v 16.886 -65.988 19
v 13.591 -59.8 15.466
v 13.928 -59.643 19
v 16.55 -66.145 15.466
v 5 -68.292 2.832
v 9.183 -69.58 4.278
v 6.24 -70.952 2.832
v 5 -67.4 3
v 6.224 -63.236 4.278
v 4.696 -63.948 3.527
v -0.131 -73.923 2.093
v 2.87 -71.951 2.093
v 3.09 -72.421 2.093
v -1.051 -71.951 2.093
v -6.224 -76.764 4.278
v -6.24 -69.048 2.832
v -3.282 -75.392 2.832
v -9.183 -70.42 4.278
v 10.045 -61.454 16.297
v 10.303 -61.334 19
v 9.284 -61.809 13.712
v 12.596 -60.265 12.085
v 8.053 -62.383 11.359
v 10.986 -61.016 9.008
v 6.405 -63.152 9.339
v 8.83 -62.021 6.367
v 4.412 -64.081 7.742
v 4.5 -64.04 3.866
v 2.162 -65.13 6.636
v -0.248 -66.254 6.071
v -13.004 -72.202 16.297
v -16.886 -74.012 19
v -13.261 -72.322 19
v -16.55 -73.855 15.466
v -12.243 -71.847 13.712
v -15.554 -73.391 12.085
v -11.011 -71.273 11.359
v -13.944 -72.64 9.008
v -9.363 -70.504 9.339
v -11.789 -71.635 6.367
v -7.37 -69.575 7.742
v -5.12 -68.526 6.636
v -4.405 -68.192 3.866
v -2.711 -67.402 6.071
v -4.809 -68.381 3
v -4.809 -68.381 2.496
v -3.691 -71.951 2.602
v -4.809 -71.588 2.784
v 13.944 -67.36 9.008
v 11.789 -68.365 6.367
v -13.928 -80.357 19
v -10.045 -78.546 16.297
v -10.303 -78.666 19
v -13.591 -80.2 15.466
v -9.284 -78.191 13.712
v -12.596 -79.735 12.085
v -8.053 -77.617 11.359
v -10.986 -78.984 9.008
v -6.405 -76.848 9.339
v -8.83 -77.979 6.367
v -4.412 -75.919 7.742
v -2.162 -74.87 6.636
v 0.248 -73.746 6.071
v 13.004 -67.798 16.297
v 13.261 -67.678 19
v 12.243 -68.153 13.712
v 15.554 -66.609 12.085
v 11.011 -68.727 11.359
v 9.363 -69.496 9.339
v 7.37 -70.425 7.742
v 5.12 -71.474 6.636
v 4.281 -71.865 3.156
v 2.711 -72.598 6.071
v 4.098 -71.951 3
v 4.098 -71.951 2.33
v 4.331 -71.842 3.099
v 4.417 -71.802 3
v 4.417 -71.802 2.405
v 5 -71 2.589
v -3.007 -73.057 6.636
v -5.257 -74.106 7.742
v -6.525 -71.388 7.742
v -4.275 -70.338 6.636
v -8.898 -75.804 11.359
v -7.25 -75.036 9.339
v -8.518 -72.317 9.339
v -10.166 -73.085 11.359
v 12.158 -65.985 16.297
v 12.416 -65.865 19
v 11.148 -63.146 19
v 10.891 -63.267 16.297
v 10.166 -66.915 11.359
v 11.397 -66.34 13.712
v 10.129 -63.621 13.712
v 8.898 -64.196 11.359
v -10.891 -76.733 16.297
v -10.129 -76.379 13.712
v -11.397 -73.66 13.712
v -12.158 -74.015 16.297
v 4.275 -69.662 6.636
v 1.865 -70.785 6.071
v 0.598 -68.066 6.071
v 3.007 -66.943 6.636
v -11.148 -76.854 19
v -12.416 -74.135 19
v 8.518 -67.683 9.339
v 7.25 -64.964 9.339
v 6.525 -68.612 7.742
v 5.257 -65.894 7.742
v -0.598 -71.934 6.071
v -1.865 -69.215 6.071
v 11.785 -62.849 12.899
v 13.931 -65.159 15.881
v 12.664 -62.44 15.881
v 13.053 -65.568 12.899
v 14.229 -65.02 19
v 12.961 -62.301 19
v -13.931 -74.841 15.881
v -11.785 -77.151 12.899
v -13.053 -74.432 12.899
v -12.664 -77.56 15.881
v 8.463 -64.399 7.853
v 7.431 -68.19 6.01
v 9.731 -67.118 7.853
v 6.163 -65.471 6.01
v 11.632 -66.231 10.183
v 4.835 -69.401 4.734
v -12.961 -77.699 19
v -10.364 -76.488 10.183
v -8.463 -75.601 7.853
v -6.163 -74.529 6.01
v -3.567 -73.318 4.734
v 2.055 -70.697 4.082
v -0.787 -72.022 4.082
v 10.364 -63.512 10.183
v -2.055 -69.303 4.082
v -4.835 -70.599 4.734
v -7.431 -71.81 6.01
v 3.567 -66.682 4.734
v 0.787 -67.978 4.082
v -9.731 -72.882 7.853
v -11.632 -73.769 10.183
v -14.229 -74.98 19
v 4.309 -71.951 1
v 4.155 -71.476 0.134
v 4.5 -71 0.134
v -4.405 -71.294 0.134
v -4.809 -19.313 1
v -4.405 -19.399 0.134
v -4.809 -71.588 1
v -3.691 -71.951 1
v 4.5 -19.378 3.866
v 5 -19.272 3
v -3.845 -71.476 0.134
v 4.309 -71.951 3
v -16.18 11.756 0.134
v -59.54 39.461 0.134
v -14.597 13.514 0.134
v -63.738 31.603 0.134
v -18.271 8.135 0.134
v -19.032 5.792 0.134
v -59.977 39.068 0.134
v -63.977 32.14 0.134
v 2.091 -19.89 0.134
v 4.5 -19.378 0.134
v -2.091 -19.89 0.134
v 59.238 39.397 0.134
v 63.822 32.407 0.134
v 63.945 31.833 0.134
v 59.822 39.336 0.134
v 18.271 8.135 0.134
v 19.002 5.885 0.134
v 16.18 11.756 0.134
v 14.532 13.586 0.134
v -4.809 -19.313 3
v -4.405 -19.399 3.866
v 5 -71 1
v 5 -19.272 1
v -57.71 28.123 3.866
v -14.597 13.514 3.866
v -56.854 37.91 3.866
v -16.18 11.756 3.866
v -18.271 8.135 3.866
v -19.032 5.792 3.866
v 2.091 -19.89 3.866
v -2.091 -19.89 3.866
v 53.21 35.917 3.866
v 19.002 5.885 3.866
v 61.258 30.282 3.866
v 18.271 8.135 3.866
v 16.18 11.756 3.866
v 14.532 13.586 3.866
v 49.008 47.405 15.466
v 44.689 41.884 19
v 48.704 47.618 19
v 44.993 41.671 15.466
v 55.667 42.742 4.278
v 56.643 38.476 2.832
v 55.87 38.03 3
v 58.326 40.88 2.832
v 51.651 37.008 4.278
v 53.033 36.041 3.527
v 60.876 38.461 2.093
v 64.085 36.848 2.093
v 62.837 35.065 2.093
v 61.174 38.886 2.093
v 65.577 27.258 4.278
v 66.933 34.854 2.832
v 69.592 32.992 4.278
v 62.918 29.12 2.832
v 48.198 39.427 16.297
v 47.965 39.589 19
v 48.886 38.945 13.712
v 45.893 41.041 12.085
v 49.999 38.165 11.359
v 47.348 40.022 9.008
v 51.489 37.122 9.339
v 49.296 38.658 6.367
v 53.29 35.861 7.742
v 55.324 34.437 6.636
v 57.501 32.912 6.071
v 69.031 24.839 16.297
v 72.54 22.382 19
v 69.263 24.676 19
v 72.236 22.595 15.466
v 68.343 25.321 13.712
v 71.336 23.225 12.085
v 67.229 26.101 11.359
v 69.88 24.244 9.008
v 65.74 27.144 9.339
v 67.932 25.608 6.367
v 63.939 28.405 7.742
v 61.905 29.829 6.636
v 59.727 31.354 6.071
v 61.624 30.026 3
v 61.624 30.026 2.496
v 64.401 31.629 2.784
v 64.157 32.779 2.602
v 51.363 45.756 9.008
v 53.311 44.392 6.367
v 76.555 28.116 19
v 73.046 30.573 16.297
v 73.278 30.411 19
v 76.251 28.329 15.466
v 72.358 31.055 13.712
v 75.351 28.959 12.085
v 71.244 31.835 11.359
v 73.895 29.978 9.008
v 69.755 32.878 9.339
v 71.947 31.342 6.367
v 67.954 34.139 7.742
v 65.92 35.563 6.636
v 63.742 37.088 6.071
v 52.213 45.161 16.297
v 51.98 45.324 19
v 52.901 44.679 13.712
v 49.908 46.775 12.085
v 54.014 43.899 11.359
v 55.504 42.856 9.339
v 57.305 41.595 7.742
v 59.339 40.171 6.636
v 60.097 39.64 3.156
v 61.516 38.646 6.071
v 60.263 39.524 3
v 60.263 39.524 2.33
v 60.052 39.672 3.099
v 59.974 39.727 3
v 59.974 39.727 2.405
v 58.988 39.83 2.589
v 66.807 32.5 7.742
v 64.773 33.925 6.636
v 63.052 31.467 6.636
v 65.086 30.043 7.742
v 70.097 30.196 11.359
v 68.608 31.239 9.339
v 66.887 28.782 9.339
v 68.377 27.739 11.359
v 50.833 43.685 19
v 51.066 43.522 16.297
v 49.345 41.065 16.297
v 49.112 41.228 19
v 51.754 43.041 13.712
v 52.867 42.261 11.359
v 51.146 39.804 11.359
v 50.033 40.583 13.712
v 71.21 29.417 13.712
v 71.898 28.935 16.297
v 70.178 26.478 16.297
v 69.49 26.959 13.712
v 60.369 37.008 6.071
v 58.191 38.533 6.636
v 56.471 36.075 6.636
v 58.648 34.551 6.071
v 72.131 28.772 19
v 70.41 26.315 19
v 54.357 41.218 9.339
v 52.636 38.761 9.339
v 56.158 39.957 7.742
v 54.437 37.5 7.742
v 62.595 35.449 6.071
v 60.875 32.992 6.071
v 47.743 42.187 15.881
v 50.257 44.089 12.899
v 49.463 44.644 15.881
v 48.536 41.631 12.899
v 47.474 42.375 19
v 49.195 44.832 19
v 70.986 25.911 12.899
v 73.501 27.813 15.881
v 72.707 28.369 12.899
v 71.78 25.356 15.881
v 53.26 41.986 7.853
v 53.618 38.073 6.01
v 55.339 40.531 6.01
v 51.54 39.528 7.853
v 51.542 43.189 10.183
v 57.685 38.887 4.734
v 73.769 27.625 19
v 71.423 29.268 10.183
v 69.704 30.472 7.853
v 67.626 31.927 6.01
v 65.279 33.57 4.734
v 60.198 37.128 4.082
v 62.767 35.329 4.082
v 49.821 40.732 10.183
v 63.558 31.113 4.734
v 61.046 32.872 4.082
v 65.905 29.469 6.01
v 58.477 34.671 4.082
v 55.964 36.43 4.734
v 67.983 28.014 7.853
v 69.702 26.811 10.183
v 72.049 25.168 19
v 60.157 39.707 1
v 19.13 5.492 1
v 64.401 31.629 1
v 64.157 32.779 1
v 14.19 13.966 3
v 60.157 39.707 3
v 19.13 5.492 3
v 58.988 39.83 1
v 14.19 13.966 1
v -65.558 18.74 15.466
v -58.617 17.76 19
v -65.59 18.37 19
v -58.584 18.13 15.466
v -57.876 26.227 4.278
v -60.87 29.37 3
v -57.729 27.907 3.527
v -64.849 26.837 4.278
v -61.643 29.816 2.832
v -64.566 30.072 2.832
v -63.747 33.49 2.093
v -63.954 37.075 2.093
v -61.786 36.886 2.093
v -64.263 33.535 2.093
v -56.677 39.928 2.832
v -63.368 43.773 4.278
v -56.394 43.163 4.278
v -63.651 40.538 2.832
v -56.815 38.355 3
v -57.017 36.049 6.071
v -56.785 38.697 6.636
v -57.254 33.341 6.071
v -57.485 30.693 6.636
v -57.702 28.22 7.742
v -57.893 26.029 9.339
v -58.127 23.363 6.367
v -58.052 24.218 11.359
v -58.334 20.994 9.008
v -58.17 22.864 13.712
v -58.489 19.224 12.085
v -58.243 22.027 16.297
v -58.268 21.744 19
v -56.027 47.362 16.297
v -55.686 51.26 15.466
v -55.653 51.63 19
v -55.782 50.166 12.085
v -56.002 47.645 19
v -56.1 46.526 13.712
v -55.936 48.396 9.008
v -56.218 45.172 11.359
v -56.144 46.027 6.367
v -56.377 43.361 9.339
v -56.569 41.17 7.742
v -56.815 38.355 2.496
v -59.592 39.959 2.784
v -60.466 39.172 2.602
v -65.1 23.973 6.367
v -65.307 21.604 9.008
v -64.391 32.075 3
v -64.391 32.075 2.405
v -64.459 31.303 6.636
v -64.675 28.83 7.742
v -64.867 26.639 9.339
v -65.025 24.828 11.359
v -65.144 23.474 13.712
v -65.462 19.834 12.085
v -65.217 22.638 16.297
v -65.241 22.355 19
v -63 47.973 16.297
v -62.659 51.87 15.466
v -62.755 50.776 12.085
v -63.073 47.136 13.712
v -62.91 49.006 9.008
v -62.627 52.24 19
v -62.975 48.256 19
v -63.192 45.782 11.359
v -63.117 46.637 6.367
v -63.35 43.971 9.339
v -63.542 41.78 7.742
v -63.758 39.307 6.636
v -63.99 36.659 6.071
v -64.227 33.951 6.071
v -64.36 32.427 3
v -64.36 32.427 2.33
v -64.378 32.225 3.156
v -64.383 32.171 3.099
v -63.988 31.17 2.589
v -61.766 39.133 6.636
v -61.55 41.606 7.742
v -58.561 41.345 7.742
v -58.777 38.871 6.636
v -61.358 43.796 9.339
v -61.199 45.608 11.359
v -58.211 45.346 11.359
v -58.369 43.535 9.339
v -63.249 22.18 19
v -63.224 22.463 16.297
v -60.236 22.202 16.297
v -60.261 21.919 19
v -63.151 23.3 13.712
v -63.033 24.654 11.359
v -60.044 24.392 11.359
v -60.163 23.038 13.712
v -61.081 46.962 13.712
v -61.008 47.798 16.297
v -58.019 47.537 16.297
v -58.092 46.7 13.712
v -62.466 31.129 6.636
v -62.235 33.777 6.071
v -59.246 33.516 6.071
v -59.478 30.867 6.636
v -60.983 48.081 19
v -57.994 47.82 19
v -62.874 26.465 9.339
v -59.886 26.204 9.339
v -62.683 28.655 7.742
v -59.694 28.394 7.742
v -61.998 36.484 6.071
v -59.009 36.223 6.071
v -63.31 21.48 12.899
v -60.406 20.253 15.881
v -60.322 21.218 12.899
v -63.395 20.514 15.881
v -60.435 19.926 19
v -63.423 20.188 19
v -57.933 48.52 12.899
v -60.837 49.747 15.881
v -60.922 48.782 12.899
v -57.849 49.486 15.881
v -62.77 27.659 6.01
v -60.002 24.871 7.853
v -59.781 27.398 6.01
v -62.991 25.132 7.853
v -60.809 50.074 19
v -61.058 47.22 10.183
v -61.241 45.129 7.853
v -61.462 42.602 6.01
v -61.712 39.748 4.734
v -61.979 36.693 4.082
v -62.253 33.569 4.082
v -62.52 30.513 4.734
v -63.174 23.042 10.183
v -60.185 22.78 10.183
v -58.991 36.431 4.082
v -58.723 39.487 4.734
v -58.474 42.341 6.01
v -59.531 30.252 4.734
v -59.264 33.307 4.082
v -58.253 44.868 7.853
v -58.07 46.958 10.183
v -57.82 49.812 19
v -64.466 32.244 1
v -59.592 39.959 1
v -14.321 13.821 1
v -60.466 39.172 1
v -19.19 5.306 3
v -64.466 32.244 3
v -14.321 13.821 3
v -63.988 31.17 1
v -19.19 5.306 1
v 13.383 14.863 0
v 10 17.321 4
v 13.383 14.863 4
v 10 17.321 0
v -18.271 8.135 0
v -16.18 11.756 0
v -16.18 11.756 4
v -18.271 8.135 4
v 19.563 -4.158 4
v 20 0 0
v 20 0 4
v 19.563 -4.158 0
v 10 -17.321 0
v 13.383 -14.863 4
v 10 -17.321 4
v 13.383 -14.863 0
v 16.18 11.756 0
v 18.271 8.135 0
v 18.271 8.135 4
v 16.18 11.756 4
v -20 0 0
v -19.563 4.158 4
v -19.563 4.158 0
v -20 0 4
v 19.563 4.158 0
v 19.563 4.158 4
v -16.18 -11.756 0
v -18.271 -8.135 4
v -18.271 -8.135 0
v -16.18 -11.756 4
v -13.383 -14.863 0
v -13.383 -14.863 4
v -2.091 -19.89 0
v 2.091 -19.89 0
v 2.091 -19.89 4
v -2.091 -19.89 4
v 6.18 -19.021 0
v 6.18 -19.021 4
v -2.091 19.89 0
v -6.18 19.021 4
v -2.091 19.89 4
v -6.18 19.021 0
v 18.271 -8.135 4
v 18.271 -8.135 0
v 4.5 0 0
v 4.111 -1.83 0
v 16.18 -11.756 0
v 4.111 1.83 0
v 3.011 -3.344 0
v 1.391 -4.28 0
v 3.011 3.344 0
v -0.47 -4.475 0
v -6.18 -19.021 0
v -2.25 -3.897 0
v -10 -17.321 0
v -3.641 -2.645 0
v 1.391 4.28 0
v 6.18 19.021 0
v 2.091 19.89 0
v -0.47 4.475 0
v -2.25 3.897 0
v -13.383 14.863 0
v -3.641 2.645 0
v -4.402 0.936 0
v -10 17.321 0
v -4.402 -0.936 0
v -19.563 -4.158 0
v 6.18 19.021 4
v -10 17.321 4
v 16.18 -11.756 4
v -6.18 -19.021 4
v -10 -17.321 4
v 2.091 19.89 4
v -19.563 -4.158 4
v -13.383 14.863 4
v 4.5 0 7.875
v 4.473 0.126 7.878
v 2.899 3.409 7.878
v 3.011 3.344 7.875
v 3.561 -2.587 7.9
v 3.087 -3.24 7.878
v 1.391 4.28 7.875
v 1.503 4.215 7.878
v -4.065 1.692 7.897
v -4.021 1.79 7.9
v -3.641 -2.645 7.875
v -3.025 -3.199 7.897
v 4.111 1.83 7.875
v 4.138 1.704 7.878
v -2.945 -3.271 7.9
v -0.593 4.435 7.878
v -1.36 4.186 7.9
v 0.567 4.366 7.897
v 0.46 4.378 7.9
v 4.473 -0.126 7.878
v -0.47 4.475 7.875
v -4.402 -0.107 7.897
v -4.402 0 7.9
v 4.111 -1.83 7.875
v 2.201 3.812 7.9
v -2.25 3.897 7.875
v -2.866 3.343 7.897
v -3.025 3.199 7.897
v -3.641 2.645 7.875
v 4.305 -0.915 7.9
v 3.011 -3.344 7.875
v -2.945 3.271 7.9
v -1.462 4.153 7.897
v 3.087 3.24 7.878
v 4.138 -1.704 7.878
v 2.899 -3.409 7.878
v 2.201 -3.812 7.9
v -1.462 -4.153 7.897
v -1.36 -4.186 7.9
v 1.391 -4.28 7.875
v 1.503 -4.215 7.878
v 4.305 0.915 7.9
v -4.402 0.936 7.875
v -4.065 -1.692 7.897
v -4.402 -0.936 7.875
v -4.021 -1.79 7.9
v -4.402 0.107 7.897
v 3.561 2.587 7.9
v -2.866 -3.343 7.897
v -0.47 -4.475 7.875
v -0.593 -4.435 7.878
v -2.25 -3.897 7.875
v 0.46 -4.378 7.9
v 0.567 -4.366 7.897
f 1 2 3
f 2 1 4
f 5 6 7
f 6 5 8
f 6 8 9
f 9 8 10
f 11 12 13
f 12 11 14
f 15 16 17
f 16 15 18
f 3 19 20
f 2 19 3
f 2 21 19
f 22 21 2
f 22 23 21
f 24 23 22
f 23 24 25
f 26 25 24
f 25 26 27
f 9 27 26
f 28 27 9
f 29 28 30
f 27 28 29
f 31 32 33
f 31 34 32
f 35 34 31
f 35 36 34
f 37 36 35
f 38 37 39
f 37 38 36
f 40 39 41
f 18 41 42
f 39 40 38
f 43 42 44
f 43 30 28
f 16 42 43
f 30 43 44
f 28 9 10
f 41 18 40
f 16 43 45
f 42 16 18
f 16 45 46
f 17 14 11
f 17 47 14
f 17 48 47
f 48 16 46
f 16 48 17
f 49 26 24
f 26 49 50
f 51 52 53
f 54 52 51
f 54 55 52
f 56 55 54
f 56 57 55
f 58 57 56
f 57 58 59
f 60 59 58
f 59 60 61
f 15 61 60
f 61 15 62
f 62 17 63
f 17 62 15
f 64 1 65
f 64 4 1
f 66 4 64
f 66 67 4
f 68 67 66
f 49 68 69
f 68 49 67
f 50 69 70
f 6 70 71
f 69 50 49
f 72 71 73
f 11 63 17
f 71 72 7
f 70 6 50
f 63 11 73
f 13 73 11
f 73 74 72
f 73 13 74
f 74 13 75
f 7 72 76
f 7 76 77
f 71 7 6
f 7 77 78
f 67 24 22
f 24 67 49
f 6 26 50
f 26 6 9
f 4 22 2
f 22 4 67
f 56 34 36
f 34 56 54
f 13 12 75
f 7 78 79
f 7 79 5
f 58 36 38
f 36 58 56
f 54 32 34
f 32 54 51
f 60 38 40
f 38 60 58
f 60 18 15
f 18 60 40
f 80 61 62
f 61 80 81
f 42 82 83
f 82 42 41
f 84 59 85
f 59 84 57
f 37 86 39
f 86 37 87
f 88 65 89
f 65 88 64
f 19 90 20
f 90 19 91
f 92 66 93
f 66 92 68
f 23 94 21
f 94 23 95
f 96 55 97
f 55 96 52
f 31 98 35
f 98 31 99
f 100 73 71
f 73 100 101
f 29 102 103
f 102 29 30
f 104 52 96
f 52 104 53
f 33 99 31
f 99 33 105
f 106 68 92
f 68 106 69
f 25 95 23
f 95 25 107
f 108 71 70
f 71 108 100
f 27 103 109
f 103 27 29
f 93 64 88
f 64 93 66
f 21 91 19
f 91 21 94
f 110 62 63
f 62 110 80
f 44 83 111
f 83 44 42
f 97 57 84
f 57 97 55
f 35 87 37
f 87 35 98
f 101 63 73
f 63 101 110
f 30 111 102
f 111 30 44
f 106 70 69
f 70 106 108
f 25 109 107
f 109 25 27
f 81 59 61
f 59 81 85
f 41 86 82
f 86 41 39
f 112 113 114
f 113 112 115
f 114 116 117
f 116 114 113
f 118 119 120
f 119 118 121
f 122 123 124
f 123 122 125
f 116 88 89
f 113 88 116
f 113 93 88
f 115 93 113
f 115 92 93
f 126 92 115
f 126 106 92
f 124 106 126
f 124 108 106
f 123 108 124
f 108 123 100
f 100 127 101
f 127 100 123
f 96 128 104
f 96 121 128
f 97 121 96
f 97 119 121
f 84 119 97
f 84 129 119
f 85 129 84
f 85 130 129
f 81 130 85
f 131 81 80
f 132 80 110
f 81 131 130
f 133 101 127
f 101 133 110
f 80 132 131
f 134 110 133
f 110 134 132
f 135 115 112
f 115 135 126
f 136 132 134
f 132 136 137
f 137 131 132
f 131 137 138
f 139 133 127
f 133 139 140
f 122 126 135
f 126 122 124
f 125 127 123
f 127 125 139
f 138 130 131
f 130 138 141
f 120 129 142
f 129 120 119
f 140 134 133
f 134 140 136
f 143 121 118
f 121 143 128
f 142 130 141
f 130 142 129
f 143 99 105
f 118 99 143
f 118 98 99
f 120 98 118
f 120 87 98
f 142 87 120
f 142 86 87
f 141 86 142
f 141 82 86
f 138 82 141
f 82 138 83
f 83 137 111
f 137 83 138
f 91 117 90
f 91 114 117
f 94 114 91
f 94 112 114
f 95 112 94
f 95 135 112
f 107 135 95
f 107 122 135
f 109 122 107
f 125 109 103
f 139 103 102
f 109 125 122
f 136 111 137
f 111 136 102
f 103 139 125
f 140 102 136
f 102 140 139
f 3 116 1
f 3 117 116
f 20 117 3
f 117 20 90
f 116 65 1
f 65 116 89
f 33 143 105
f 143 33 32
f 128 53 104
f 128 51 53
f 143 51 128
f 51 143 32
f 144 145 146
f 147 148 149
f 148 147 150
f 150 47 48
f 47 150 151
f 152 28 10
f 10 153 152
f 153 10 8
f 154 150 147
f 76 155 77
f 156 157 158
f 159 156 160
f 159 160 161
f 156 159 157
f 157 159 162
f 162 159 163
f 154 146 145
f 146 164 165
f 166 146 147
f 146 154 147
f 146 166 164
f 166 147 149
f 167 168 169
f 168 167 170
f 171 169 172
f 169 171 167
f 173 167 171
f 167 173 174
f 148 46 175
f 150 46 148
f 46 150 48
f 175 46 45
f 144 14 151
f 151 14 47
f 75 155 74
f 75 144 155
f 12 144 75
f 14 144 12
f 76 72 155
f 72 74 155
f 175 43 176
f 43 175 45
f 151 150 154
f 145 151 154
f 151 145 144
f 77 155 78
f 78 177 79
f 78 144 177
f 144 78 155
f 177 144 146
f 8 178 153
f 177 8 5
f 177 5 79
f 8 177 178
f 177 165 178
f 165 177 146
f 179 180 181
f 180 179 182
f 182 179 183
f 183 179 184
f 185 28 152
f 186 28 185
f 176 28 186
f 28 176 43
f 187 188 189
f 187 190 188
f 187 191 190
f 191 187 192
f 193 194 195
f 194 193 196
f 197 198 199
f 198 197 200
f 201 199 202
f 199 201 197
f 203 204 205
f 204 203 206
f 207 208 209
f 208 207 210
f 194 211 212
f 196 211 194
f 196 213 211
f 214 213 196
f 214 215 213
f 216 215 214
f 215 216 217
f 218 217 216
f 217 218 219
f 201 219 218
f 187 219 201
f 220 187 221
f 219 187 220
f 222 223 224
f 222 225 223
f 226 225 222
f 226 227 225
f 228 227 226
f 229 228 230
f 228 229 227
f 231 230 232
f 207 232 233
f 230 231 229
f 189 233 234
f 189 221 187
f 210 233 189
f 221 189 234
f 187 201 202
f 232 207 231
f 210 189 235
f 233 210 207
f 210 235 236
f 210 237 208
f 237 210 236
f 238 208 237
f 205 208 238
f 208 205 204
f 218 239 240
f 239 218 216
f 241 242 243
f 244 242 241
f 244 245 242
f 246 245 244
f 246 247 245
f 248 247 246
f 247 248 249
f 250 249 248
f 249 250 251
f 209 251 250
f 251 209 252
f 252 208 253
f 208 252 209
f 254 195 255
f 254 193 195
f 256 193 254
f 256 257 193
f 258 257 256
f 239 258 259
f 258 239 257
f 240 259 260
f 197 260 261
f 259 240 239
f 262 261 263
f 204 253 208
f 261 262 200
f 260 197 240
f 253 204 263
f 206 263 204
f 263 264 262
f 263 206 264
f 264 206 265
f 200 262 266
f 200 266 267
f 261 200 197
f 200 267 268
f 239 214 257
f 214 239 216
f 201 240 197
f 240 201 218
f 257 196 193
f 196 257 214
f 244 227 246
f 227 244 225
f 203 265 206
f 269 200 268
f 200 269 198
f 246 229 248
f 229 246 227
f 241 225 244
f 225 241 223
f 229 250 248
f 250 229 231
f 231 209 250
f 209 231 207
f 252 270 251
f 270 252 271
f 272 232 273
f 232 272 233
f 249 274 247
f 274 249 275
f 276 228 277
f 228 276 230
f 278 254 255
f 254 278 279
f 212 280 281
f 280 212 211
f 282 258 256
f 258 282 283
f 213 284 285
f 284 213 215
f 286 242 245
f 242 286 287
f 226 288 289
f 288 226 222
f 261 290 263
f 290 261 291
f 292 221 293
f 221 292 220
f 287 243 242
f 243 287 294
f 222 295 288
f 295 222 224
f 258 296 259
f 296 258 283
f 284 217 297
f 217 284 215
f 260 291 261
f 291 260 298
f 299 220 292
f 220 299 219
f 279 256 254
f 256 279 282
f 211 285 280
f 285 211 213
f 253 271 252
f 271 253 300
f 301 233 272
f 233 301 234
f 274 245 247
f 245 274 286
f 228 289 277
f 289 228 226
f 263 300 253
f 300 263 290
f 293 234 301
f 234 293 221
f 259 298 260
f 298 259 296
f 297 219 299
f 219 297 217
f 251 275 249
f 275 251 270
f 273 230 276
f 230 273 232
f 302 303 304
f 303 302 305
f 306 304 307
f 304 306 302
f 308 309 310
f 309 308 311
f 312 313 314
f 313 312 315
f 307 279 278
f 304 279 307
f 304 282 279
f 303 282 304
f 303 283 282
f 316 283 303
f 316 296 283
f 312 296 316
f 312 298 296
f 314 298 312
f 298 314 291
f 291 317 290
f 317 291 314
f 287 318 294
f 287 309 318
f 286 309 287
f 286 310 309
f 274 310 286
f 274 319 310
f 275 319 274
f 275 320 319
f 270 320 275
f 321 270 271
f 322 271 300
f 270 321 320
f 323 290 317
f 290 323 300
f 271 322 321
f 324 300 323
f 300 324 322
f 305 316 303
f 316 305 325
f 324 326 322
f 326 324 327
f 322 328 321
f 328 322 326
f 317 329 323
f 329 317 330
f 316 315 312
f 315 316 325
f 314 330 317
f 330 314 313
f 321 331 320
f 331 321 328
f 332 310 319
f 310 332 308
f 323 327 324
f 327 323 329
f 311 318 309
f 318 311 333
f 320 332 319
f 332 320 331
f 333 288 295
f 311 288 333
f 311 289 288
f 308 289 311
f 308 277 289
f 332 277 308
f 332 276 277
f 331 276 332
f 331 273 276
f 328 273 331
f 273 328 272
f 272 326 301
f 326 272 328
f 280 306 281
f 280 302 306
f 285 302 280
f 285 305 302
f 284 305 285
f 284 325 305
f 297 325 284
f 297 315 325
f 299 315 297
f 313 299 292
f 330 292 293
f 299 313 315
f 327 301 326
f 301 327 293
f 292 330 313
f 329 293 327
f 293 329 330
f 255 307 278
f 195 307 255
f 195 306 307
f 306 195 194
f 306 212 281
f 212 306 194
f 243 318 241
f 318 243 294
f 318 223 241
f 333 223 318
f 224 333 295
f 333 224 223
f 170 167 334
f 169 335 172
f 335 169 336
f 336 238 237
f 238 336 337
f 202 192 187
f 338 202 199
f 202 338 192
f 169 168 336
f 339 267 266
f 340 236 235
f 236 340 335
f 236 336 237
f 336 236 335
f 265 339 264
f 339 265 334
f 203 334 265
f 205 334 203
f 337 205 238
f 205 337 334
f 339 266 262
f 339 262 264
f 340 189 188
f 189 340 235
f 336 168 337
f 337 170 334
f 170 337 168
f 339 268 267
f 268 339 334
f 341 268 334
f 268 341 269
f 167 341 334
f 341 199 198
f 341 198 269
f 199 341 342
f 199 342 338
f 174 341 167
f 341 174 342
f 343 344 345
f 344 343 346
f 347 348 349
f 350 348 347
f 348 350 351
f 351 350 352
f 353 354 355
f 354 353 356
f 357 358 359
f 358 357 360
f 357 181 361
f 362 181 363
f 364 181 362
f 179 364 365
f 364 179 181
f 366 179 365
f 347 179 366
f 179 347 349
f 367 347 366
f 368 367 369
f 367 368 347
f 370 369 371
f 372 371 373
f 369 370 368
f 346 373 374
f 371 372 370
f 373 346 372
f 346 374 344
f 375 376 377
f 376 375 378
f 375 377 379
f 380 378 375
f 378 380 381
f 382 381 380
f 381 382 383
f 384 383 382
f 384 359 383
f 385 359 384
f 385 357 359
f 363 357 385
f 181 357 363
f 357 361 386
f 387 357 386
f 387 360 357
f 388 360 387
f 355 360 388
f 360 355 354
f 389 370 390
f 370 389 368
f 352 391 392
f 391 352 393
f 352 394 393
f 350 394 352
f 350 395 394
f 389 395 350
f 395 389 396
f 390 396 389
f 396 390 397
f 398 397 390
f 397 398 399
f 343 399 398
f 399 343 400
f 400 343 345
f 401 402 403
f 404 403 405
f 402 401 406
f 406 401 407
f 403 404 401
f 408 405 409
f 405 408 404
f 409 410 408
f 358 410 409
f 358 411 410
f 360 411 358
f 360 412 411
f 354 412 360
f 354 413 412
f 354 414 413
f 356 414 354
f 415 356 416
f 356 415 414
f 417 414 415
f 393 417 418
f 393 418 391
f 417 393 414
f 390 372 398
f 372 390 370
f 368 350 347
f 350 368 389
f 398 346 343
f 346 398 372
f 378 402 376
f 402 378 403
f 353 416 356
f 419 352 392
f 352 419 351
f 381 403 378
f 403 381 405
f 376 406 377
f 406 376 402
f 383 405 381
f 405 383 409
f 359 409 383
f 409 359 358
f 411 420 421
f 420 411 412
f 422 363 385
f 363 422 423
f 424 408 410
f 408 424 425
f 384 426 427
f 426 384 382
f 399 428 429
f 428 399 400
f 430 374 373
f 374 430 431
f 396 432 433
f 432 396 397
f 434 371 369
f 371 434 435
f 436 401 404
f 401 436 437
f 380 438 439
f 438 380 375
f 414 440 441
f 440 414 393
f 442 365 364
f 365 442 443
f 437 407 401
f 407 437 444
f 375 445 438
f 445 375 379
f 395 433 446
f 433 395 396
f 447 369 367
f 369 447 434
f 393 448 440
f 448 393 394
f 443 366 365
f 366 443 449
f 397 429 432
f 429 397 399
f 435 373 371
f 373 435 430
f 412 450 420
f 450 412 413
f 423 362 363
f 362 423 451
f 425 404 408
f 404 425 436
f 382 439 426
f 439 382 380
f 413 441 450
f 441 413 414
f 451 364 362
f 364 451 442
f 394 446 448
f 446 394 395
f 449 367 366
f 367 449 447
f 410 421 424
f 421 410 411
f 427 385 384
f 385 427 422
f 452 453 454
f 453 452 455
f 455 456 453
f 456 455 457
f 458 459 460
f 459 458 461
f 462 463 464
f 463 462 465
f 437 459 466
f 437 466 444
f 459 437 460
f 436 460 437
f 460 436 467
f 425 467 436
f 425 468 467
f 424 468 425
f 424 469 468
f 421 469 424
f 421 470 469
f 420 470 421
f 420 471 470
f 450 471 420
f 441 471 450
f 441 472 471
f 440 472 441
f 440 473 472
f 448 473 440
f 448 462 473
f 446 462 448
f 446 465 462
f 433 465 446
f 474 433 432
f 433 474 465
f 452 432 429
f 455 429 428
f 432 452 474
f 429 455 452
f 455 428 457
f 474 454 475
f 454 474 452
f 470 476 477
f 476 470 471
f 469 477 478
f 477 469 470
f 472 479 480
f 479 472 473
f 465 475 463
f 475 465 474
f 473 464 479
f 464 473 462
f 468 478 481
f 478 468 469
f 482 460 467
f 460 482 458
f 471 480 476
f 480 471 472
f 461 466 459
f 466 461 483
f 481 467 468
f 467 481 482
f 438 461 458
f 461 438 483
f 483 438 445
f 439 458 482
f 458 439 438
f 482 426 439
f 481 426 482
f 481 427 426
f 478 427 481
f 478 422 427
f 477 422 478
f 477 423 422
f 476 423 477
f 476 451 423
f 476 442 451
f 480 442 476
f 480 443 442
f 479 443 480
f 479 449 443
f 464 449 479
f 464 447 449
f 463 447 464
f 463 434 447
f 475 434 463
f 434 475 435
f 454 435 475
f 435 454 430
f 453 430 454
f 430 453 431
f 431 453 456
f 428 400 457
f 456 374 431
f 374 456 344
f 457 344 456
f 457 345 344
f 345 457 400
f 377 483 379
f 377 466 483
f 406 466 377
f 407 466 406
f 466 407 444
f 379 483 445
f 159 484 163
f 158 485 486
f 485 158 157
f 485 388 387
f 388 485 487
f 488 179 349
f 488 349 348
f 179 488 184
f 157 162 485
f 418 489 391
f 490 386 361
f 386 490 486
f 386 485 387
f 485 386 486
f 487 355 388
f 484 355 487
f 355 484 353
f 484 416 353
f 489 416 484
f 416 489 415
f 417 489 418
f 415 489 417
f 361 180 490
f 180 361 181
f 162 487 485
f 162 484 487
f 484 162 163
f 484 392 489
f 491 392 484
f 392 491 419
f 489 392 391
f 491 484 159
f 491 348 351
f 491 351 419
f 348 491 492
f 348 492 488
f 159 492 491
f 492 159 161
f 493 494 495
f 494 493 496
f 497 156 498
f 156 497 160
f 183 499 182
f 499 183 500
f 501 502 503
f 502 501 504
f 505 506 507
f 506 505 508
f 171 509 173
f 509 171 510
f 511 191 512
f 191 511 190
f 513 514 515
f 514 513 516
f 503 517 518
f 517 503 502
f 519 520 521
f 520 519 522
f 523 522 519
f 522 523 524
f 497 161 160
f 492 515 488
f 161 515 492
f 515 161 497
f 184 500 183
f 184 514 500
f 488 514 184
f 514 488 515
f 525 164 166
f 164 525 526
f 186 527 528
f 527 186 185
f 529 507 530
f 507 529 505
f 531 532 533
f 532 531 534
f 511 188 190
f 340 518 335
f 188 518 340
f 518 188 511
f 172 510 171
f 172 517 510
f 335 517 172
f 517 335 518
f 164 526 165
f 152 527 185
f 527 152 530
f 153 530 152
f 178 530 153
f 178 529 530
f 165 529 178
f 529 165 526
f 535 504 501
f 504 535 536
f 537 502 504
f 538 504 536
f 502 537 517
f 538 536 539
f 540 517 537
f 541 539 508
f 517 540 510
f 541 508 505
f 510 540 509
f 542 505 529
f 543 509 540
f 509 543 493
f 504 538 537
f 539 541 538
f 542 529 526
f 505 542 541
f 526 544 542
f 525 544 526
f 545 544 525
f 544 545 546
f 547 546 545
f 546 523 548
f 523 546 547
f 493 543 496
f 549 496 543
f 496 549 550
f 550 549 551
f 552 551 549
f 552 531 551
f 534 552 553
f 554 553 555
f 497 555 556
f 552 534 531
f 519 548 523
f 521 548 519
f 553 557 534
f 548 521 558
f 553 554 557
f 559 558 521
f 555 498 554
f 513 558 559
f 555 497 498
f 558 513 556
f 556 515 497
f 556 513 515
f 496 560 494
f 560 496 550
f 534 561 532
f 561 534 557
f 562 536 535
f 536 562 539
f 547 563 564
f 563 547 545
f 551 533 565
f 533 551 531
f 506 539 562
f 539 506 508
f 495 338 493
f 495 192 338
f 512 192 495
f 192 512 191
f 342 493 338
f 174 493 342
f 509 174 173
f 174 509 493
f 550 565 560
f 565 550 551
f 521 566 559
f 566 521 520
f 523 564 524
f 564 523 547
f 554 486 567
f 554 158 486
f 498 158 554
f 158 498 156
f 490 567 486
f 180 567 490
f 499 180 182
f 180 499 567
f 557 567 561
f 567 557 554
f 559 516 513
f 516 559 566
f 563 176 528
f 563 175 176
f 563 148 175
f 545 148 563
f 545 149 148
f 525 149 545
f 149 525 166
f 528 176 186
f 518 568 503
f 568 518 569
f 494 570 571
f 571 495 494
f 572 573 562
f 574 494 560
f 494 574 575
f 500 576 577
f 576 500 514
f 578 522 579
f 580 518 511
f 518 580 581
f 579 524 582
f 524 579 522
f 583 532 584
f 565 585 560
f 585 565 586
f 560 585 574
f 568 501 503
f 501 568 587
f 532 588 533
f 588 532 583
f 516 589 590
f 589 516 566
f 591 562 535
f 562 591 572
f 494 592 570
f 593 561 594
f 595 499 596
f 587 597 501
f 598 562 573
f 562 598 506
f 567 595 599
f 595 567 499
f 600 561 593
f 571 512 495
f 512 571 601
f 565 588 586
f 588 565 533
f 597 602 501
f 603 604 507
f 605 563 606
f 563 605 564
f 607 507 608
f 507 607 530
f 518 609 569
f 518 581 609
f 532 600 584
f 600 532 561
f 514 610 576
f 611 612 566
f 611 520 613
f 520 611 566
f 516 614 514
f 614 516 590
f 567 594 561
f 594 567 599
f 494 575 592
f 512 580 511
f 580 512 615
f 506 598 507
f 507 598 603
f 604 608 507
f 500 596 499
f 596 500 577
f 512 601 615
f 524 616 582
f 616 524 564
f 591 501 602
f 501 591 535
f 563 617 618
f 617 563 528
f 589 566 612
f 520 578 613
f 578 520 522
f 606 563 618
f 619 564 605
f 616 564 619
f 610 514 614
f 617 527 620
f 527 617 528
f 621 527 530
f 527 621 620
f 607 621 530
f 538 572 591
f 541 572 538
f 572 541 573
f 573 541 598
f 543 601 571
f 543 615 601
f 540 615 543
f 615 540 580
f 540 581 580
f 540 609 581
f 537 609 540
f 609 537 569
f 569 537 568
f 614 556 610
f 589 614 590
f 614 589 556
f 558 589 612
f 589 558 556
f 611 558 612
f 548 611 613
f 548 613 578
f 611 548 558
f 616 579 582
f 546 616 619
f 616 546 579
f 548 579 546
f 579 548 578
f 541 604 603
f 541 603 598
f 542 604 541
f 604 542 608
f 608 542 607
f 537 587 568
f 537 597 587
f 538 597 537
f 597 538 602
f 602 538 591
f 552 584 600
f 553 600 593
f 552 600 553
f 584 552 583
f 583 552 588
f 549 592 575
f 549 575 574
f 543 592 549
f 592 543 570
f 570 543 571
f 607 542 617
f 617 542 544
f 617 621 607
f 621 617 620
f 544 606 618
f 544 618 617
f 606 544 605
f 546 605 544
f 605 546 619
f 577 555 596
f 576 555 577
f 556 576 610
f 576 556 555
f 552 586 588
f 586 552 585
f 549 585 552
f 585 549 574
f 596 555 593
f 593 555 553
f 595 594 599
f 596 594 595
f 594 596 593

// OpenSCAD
// file: common.scad
coin_small_diameter=30;
coin_big_diameter=36;
coin_height=3;

nut_diameter_inner = 6;
nut_diameter_outer = 8;

roller_diameter= 22;
roller_diameter_inner= 10;
roller_width = 8;
// main file
include <./common.scad>

branch_length = 70;
branch_width = 10;

holder_border_width = 2;

branch_height = holder_border_width * 2;
branch_softness = 1;

base_height = 8;
base_radius = branch_width*2;
coin_rotation = 25;

branches_number = 3;


module branch(coin_diameter){
    module coin(){#
        cylinder(h = coin_height, d= coin_diameter);
    }
    
    translate([0,-branch_length,0])
    union(){
        
        // Holder
        holder_diameter = coin_diameter + holder_border_width*2;
        holder_height = coin_height + holder_border_width*2;
        rotate([0,0,coin_rotation])
        translate([0,holder_height/2,holder_diameter/2 + holder_border_width])
        rotate([90,0,0])
        difference(){
            cylinder(h= holder_height, d= holder_diameter);

            translate([0,0,-0.1])
            cylinder(h= holder_height + 0.2, d = coin_diameter - holder_border_width*2);

            translate([0,0,holder_border_width])
            coin();

            rotate([90,0,0])
            translate([-holder_diameter/2,-0.1,-holder_diameter/2])
            cube([holder_diameter, holder_height+0.2, holder_diameter/2]);
        }
        
        // Branch
        translate([
            -branch_width/2+branch_softness,
            branch_softness - holder_border_width,
            branch_softness])
        minkowski(){
            sphere(r = branch_softness);
            cube([
                branch_width-branch_softness*2,
                branch_length,
                branch_height-branch_softness*2]);
        }
    }
}

module branch_level(coin_diameter){
    difference(){
        union(){
            // branches
            for(branch_number = [0:branches_number-1]){
                branch_angle = 360/branches_number * branch_number;
                rotate([0,0,branch_angle])
                branch(coin_diameter);
            }
            // Branch base 
            cylinder(h= branch_height, r = base_radius);
            // Branch base top
            translate([0,0, branch_height])
            cylinder(h= base_height-branch_height, r1 = base_radius, r2= nut_diameter_outer/2);
        }
        // Bolt hole
        #
        translate([0,0,-0.1])
        cylinder(h=base_height+ 0.2, d= nut_diameter_outer+1);
    }
}

branch_level(coin_small_diameter);
